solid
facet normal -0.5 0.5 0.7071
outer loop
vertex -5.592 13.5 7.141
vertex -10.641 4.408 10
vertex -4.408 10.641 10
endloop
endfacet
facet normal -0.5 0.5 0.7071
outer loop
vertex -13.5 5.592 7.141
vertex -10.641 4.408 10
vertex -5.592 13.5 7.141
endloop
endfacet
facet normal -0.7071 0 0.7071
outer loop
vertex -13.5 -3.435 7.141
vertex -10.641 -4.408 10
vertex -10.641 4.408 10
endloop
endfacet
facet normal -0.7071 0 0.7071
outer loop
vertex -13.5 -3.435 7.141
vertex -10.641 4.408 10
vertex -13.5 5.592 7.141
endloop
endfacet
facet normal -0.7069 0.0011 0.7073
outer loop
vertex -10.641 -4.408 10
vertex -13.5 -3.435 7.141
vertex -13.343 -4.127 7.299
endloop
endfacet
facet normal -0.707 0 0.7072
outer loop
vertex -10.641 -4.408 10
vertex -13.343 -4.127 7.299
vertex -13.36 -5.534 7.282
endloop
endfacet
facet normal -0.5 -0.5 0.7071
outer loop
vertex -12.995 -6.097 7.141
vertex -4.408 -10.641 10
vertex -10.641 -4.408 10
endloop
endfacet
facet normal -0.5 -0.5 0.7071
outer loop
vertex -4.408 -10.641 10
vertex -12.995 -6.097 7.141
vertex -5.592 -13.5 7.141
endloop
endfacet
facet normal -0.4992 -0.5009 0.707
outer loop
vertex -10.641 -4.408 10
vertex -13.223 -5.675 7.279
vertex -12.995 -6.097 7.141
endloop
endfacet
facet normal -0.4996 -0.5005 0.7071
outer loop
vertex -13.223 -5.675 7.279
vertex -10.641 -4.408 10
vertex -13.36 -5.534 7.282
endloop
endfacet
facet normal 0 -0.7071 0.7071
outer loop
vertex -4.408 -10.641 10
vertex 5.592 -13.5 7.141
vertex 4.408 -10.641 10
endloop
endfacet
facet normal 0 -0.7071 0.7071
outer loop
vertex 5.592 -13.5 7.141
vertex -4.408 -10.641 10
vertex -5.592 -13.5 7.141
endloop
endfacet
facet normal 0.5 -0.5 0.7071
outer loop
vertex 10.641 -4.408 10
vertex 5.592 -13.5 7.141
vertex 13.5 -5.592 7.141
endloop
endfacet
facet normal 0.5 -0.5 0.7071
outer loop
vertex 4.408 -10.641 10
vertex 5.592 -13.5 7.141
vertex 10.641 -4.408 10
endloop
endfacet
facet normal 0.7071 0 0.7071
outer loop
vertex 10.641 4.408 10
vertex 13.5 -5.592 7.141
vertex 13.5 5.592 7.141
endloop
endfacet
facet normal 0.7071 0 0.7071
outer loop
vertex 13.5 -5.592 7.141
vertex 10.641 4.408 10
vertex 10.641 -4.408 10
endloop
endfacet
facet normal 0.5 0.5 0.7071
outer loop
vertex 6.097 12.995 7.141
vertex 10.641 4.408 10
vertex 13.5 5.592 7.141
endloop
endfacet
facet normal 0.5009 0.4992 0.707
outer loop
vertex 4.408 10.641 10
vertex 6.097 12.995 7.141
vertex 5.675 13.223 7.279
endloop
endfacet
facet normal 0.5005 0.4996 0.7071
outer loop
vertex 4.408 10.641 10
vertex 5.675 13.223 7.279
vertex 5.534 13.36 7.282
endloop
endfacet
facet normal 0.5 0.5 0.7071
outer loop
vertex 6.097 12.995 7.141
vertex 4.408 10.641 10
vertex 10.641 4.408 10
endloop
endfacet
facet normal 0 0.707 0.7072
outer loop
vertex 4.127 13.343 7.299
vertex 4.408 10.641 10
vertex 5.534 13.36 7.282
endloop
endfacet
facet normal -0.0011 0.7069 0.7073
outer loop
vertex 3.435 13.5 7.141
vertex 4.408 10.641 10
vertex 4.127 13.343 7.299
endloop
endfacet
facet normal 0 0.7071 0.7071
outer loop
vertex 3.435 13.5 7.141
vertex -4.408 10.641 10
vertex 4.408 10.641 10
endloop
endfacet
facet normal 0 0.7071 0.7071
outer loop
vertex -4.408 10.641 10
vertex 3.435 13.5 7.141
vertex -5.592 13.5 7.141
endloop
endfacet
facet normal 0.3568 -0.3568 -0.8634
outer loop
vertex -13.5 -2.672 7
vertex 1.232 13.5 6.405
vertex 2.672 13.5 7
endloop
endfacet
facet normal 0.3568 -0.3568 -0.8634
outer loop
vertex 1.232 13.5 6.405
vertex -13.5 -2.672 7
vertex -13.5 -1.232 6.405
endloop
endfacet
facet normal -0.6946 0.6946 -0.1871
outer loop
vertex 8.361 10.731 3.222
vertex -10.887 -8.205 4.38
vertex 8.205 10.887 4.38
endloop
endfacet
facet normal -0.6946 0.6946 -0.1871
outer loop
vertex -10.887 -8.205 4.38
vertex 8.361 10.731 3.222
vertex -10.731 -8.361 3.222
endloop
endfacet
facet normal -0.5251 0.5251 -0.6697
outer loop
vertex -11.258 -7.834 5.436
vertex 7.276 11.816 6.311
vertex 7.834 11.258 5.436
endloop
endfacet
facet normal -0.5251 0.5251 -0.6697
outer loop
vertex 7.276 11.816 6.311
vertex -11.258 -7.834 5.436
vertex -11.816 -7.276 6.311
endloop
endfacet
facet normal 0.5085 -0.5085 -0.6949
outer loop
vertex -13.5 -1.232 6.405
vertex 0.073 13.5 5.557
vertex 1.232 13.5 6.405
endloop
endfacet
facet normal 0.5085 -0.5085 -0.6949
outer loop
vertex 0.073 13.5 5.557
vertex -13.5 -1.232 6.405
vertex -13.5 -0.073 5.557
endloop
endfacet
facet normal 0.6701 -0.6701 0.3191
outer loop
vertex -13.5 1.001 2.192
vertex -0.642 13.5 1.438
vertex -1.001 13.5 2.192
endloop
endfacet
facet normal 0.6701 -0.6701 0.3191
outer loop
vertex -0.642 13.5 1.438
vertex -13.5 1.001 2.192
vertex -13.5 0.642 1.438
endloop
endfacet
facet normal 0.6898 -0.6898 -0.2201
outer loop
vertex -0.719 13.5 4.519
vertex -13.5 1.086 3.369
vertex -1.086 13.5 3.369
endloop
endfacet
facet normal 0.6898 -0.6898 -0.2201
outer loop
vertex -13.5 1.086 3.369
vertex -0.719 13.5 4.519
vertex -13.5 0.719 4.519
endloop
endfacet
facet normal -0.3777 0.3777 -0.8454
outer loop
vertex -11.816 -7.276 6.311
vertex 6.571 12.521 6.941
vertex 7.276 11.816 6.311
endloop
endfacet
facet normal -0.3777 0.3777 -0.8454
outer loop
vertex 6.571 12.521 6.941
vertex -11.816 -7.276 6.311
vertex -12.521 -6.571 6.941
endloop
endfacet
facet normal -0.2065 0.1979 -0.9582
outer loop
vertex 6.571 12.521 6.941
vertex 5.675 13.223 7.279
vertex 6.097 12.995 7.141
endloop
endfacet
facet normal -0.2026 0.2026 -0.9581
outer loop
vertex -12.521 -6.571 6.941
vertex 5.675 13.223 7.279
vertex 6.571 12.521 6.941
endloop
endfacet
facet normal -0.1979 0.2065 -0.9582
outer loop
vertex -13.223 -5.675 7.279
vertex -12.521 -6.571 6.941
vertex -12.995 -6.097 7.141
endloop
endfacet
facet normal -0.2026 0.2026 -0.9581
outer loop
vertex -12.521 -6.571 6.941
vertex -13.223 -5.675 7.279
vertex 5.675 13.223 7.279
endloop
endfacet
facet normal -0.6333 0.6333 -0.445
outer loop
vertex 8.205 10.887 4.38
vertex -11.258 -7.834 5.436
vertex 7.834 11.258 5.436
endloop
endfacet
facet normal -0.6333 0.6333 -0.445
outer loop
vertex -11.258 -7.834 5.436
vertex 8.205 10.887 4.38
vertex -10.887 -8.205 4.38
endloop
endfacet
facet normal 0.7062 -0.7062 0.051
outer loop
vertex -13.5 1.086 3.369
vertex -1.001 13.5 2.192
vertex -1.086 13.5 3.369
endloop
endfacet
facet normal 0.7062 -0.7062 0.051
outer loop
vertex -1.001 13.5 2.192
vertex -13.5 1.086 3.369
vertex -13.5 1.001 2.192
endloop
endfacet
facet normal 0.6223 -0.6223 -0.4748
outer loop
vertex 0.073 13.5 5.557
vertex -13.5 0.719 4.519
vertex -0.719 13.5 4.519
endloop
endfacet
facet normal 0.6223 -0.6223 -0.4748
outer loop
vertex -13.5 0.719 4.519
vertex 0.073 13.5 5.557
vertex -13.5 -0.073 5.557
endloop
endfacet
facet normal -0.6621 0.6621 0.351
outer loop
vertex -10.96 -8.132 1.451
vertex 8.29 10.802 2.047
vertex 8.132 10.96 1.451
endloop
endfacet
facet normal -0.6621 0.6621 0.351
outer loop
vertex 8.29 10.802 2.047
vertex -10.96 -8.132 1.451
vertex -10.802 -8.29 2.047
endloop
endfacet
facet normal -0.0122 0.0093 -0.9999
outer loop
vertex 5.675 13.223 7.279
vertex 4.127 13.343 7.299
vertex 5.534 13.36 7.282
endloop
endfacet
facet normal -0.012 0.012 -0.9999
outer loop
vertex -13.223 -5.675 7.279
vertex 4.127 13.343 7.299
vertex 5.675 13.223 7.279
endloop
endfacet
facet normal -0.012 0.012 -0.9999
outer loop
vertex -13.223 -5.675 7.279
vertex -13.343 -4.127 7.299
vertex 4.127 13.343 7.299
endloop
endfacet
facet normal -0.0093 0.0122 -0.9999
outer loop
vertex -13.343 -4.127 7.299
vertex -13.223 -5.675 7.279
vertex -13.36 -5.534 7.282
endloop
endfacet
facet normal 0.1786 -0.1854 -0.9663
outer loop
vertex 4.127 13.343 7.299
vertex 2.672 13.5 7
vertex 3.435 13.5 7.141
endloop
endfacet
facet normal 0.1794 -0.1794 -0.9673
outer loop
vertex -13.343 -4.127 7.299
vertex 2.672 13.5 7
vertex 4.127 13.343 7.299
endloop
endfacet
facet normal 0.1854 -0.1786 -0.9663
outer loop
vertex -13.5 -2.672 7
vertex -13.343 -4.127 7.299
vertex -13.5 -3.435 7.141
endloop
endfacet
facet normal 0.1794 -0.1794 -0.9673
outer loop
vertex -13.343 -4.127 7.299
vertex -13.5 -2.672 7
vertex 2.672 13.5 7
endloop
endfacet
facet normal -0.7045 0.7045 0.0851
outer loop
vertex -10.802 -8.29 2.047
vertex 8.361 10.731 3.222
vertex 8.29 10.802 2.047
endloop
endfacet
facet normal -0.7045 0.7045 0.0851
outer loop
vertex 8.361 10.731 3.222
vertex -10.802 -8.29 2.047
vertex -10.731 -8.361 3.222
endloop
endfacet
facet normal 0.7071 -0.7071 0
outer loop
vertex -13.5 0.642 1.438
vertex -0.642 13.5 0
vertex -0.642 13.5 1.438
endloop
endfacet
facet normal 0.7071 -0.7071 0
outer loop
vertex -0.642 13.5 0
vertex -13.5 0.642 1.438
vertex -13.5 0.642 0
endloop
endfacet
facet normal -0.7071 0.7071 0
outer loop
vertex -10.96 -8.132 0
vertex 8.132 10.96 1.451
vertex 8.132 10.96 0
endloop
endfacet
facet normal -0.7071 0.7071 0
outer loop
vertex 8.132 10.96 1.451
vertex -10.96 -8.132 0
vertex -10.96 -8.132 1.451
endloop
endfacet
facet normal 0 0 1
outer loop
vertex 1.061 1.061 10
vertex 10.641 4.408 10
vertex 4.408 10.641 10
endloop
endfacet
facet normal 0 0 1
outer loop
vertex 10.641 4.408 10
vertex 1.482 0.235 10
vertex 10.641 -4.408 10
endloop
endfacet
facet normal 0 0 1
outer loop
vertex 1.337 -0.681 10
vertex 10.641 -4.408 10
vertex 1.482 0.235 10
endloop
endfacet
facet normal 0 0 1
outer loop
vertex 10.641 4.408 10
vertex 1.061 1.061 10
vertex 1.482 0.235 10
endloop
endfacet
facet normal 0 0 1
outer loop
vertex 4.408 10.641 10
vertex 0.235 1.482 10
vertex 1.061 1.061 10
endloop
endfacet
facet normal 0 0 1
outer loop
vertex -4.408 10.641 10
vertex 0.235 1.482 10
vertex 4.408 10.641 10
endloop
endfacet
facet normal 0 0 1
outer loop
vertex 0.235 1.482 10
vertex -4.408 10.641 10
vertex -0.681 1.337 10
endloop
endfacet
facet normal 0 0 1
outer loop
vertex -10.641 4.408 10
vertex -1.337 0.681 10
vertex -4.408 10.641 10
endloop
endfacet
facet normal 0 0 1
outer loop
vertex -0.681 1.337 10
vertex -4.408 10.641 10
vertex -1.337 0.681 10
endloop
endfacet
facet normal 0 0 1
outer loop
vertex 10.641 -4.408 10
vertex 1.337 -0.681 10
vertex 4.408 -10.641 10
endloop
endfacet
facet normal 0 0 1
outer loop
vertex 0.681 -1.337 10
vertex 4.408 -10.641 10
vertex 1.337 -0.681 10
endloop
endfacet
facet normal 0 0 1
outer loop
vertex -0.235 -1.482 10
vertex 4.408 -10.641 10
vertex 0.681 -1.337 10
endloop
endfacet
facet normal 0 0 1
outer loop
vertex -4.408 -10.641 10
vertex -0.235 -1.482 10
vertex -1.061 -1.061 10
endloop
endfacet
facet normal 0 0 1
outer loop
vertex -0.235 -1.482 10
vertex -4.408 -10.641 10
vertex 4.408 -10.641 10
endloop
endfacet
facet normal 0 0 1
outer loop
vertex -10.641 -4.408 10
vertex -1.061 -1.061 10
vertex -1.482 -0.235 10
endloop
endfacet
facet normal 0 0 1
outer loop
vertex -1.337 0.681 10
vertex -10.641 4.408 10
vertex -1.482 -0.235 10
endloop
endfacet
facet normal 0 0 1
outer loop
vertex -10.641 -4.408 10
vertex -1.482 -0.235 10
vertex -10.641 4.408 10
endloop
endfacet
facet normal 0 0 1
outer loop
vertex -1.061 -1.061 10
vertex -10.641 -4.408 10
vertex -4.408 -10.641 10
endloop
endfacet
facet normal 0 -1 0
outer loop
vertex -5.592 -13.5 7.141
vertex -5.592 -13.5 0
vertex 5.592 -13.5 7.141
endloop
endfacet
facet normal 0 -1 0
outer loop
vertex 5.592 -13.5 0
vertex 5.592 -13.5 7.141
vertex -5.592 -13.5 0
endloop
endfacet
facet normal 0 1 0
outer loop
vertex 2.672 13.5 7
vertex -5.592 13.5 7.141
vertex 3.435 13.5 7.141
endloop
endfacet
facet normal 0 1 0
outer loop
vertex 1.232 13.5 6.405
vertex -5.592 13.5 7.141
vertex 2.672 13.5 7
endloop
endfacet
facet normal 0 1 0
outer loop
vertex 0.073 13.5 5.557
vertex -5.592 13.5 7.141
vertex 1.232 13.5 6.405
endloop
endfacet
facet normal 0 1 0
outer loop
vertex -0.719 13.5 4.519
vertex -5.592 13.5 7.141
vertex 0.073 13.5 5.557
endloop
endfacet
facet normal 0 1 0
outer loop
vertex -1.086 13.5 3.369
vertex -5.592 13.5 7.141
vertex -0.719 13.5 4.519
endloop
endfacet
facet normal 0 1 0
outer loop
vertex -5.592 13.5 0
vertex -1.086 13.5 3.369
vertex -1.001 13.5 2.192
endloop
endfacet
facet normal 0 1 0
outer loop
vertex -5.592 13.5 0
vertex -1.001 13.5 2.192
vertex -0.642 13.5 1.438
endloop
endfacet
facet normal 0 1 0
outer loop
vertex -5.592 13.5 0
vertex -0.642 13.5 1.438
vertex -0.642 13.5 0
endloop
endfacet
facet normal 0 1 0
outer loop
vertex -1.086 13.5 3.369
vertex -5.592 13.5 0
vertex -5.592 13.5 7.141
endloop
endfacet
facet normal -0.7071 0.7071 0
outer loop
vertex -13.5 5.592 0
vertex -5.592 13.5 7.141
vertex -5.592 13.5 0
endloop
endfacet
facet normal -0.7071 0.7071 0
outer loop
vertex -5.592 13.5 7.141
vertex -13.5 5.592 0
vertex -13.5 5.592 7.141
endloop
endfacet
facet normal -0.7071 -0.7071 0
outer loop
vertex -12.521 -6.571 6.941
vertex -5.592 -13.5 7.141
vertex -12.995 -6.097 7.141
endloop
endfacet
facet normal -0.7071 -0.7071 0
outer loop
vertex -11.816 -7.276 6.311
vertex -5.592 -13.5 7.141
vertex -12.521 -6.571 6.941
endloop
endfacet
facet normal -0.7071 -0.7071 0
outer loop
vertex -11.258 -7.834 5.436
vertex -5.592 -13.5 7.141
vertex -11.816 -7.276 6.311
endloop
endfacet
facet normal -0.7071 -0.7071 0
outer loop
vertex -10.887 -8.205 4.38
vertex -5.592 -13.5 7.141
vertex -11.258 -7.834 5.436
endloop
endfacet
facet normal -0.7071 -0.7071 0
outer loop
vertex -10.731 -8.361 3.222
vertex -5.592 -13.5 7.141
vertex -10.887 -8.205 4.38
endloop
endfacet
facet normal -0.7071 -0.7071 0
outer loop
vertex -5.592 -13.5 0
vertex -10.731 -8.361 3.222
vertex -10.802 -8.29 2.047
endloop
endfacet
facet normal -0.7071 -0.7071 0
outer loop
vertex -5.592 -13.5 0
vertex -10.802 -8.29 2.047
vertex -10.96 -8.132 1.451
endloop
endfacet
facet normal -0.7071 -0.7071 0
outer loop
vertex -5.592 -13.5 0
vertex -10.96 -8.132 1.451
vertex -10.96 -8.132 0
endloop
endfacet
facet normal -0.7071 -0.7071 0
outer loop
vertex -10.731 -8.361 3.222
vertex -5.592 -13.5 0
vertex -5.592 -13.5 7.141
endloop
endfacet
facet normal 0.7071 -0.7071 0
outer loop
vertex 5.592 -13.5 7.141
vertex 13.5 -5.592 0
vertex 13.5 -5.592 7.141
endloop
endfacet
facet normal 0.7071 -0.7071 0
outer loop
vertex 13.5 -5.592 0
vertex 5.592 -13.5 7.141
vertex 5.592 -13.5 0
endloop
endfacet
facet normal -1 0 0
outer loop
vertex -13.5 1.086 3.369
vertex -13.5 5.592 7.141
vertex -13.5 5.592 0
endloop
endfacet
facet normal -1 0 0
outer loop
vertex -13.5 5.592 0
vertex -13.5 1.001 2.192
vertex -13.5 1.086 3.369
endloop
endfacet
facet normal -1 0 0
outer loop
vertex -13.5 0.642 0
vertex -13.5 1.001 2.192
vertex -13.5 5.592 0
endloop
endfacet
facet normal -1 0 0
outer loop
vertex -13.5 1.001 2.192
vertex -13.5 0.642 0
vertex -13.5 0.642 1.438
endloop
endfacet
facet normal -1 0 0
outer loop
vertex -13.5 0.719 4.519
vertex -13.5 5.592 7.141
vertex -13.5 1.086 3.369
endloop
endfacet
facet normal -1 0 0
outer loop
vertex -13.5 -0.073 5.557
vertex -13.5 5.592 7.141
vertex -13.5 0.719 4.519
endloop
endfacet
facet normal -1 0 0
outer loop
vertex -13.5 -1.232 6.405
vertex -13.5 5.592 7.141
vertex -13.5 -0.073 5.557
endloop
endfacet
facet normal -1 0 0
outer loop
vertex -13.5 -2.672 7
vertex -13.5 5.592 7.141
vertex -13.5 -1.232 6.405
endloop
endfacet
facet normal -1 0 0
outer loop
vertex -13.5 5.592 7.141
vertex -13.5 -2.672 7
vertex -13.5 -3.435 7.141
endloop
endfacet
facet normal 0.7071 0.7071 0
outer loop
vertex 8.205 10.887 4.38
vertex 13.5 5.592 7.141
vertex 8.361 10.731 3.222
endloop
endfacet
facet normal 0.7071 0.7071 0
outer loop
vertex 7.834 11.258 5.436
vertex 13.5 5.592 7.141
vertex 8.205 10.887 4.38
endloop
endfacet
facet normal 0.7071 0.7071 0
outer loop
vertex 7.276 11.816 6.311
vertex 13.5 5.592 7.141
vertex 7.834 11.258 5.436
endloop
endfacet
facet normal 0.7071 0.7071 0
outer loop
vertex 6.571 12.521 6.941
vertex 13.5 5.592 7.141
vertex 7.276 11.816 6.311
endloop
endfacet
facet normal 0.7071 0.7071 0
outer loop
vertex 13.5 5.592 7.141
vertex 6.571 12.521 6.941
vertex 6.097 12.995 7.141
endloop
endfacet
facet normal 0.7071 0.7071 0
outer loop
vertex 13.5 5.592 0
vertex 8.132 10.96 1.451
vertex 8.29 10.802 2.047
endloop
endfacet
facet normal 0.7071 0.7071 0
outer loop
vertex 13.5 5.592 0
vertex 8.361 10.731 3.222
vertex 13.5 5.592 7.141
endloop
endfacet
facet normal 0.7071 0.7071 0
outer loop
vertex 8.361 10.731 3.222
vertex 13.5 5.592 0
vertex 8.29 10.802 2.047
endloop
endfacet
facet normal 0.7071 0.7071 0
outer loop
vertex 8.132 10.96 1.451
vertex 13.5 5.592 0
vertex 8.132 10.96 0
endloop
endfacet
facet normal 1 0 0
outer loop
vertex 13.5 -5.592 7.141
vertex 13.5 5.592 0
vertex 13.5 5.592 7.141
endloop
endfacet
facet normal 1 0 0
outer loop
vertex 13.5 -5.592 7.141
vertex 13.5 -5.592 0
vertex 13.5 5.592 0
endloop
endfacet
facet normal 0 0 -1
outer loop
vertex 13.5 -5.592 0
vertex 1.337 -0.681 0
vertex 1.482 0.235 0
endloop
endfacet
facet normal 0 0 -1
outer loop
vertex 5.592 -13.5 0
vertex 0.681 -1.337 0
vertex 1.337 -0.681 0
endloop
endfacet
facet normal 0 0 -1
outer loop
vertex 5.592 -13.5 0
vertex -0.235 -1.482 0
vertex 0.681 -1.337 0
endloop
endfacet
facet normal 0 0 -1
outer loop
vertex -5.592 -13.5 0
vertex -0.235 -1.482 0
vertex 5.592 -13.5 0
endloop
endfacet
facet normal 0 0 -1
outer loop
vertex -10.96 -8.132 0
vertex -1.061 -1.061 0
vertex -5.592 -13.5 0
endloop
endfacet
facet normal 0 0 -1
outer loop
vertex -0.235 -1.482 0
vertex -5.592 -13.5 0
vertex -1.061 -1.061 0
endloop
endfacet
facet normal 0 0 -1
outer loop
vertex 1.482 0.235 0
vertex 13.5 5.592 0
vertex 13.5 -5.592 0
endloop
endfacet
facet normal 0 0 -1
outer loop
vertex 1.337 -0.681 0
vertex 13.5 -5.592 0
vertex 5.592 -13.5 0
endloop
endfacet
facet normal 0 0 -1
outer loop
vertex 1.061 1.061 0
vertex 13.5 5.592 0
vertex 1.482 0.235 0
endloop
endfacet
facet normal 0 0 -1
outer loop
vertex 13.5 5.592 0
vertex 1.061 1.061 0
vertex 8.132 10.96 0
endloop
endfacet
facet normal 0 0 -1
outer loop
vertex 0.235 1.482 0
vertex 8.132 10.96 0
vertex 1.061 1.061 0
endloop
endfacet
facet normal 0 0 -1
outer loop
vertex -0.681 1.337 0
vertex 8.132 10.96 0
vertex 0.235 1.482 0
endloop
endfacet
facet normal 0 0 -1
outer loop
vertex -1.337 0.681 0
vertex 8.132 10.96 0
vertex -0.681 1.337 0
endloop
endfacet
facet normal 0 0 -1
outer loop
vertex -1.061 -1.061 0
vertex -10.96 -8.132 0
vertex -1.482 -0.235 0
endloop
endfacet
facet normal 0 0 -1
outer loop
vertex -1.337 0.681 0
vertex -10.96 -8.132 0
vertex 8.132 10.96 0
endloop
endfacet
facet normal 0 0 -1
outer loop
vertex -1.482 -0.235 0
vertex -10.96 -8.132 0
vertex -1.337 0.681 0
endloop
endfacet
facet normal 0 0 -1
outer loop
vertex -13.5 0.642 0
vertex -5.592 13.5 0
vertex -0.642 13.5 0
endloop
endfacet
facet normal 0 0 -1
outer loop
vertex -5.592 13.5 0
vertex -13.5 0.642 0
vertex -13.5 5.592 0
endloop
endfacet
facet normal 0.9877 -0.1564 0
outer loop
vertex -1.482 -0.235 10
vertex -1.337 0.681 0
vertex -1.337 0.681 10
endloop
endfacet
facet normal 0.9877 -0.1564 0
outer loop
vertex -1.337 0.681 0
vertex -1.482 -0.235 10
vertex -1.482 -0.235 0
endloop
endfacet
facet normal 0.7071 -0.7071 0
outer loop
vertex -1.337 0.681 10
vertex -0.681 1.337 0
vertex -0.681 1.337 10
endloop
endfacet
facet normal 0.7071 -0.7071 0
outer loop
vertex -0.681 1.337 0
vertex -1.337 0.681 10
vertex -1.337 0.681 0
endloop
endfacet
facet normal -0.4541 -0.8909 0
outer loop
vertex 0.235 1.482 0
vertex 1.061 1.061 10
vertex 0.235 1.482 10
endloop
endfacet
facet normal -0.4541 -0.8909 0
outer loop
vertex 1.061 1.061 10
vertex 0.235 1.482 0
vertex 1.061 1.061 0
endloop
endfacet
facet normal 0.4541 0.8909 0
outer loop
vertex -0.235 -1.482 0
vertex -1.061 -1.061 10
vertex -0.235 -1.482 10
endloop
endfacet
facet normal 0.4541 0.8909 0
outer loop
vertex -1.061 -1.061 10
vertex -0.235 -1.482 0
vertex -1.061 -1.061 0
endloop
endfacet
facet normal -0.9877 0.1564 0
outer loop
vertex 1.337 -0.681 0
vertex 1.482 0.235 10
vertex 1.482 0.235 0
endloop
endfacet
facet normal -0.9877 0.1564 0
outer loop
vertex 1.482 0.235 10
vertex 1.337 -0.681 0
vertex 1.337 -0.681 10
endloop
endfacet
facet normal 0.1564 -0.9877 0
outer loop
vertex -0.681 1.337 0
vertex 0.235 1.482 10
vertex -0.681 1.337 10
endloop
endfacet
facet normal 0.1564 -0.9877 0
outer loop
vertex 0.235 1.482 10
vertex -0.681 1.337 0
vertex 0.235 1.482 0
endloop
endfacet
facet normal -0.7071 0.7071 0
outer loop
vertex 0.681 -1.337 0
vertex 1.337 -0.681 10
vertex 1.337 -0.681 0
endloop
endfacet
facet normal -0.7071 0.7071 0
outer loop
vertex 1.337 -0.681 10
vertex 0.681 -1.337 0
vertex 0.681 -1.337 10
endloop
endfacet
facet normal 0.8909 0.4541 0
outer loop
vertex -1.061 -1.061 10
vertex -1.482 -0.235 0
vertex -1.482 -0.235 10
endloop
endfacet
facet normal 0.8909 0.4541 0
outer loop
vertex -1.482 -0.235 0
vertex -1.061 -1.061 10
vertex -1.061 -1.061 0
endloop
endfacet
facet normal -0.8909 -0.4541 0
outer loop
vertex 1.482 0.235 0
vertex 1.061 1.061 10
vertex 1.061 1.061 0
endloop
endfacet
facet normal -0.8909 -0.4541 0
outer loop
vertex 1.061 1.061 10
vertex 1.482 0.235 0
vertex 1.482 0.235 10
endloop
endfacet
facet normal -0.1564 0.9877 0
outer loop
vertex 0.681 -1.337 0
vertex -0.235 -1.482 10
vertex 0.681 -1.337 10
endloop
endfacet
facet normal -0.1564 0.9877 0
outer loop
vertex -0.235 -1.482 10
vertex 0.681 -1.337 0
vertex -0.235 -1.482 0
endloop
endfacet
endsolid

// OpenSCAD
// Rod diameter
rod_dia=8;
// Wall thickness
wall=3;
// Screw diameter
screw_dia=3;
// Gap between clamps.
gap=2;
// Space between screw and rod.
screw_separation=1;
// Bevel
bevel=1;  //  [1, 0]
// Smooth channel
smooth=1;  //  [1, 0]


/* [Hidden] */
render_movable_parts = false;

module rod() {
  color([0.7, 0.7, 0.7]) {
    rotate([0,0,180/8])
      cylinder(r=rod_dia/2/cos(180/8), h=80, $fn=smooth ? 23 : 8, center=true);
  }
}

module clamp() {
  dia = rod_dia + screw_dia/2 + screw_separation+ wall;
  difference() {
    rotate([0,90,0])  {
      rotate([0,0,45/2]) {
	translate([0,0,gap / 2]) {
	  cylinder(r=dia/cos(180/8),
		   h=rod_dia+wall-gap / 2, $fn=8);
	}
      }
    }
    if (bevel) {
      for (rot=[0:45:360]) {
        rotate([rot,0,0]) {
  	  translate([rod_dia+wall,dia,0]) {
	    rotate([0,0,45]) {
	      cube([wall*2 * cos(180/4) - 0.2, 100, 100], center=true);
            }
	  }
        }
      }
    }
    translate([rod_dia/2,
	       (rod_dia+screw_dia+screw_separation)/2,0]) {
      rod();
      translate([-rod_dia/2, 0,0]) {
      cube([rod_dia, rod_dia, 100], center=true);
      }
    }
    rotate([0,90,0])  {
      cylinder(r=screw_dia/2, $fn=10, h = 100, center=true);
    }
  }
  if (render_movable_parts) {
    translate([rod_dia/2, (rod_dia+screw_dia+screw_separation)/2,0]) rod();
  }
}

rotate([0,90,0]) {
  translate([gap / 2,0,0]) {
    if (render_movable_parts) {
      clamp();
    }
    
    rotate([45,180,0]) clamp();
  }
}
